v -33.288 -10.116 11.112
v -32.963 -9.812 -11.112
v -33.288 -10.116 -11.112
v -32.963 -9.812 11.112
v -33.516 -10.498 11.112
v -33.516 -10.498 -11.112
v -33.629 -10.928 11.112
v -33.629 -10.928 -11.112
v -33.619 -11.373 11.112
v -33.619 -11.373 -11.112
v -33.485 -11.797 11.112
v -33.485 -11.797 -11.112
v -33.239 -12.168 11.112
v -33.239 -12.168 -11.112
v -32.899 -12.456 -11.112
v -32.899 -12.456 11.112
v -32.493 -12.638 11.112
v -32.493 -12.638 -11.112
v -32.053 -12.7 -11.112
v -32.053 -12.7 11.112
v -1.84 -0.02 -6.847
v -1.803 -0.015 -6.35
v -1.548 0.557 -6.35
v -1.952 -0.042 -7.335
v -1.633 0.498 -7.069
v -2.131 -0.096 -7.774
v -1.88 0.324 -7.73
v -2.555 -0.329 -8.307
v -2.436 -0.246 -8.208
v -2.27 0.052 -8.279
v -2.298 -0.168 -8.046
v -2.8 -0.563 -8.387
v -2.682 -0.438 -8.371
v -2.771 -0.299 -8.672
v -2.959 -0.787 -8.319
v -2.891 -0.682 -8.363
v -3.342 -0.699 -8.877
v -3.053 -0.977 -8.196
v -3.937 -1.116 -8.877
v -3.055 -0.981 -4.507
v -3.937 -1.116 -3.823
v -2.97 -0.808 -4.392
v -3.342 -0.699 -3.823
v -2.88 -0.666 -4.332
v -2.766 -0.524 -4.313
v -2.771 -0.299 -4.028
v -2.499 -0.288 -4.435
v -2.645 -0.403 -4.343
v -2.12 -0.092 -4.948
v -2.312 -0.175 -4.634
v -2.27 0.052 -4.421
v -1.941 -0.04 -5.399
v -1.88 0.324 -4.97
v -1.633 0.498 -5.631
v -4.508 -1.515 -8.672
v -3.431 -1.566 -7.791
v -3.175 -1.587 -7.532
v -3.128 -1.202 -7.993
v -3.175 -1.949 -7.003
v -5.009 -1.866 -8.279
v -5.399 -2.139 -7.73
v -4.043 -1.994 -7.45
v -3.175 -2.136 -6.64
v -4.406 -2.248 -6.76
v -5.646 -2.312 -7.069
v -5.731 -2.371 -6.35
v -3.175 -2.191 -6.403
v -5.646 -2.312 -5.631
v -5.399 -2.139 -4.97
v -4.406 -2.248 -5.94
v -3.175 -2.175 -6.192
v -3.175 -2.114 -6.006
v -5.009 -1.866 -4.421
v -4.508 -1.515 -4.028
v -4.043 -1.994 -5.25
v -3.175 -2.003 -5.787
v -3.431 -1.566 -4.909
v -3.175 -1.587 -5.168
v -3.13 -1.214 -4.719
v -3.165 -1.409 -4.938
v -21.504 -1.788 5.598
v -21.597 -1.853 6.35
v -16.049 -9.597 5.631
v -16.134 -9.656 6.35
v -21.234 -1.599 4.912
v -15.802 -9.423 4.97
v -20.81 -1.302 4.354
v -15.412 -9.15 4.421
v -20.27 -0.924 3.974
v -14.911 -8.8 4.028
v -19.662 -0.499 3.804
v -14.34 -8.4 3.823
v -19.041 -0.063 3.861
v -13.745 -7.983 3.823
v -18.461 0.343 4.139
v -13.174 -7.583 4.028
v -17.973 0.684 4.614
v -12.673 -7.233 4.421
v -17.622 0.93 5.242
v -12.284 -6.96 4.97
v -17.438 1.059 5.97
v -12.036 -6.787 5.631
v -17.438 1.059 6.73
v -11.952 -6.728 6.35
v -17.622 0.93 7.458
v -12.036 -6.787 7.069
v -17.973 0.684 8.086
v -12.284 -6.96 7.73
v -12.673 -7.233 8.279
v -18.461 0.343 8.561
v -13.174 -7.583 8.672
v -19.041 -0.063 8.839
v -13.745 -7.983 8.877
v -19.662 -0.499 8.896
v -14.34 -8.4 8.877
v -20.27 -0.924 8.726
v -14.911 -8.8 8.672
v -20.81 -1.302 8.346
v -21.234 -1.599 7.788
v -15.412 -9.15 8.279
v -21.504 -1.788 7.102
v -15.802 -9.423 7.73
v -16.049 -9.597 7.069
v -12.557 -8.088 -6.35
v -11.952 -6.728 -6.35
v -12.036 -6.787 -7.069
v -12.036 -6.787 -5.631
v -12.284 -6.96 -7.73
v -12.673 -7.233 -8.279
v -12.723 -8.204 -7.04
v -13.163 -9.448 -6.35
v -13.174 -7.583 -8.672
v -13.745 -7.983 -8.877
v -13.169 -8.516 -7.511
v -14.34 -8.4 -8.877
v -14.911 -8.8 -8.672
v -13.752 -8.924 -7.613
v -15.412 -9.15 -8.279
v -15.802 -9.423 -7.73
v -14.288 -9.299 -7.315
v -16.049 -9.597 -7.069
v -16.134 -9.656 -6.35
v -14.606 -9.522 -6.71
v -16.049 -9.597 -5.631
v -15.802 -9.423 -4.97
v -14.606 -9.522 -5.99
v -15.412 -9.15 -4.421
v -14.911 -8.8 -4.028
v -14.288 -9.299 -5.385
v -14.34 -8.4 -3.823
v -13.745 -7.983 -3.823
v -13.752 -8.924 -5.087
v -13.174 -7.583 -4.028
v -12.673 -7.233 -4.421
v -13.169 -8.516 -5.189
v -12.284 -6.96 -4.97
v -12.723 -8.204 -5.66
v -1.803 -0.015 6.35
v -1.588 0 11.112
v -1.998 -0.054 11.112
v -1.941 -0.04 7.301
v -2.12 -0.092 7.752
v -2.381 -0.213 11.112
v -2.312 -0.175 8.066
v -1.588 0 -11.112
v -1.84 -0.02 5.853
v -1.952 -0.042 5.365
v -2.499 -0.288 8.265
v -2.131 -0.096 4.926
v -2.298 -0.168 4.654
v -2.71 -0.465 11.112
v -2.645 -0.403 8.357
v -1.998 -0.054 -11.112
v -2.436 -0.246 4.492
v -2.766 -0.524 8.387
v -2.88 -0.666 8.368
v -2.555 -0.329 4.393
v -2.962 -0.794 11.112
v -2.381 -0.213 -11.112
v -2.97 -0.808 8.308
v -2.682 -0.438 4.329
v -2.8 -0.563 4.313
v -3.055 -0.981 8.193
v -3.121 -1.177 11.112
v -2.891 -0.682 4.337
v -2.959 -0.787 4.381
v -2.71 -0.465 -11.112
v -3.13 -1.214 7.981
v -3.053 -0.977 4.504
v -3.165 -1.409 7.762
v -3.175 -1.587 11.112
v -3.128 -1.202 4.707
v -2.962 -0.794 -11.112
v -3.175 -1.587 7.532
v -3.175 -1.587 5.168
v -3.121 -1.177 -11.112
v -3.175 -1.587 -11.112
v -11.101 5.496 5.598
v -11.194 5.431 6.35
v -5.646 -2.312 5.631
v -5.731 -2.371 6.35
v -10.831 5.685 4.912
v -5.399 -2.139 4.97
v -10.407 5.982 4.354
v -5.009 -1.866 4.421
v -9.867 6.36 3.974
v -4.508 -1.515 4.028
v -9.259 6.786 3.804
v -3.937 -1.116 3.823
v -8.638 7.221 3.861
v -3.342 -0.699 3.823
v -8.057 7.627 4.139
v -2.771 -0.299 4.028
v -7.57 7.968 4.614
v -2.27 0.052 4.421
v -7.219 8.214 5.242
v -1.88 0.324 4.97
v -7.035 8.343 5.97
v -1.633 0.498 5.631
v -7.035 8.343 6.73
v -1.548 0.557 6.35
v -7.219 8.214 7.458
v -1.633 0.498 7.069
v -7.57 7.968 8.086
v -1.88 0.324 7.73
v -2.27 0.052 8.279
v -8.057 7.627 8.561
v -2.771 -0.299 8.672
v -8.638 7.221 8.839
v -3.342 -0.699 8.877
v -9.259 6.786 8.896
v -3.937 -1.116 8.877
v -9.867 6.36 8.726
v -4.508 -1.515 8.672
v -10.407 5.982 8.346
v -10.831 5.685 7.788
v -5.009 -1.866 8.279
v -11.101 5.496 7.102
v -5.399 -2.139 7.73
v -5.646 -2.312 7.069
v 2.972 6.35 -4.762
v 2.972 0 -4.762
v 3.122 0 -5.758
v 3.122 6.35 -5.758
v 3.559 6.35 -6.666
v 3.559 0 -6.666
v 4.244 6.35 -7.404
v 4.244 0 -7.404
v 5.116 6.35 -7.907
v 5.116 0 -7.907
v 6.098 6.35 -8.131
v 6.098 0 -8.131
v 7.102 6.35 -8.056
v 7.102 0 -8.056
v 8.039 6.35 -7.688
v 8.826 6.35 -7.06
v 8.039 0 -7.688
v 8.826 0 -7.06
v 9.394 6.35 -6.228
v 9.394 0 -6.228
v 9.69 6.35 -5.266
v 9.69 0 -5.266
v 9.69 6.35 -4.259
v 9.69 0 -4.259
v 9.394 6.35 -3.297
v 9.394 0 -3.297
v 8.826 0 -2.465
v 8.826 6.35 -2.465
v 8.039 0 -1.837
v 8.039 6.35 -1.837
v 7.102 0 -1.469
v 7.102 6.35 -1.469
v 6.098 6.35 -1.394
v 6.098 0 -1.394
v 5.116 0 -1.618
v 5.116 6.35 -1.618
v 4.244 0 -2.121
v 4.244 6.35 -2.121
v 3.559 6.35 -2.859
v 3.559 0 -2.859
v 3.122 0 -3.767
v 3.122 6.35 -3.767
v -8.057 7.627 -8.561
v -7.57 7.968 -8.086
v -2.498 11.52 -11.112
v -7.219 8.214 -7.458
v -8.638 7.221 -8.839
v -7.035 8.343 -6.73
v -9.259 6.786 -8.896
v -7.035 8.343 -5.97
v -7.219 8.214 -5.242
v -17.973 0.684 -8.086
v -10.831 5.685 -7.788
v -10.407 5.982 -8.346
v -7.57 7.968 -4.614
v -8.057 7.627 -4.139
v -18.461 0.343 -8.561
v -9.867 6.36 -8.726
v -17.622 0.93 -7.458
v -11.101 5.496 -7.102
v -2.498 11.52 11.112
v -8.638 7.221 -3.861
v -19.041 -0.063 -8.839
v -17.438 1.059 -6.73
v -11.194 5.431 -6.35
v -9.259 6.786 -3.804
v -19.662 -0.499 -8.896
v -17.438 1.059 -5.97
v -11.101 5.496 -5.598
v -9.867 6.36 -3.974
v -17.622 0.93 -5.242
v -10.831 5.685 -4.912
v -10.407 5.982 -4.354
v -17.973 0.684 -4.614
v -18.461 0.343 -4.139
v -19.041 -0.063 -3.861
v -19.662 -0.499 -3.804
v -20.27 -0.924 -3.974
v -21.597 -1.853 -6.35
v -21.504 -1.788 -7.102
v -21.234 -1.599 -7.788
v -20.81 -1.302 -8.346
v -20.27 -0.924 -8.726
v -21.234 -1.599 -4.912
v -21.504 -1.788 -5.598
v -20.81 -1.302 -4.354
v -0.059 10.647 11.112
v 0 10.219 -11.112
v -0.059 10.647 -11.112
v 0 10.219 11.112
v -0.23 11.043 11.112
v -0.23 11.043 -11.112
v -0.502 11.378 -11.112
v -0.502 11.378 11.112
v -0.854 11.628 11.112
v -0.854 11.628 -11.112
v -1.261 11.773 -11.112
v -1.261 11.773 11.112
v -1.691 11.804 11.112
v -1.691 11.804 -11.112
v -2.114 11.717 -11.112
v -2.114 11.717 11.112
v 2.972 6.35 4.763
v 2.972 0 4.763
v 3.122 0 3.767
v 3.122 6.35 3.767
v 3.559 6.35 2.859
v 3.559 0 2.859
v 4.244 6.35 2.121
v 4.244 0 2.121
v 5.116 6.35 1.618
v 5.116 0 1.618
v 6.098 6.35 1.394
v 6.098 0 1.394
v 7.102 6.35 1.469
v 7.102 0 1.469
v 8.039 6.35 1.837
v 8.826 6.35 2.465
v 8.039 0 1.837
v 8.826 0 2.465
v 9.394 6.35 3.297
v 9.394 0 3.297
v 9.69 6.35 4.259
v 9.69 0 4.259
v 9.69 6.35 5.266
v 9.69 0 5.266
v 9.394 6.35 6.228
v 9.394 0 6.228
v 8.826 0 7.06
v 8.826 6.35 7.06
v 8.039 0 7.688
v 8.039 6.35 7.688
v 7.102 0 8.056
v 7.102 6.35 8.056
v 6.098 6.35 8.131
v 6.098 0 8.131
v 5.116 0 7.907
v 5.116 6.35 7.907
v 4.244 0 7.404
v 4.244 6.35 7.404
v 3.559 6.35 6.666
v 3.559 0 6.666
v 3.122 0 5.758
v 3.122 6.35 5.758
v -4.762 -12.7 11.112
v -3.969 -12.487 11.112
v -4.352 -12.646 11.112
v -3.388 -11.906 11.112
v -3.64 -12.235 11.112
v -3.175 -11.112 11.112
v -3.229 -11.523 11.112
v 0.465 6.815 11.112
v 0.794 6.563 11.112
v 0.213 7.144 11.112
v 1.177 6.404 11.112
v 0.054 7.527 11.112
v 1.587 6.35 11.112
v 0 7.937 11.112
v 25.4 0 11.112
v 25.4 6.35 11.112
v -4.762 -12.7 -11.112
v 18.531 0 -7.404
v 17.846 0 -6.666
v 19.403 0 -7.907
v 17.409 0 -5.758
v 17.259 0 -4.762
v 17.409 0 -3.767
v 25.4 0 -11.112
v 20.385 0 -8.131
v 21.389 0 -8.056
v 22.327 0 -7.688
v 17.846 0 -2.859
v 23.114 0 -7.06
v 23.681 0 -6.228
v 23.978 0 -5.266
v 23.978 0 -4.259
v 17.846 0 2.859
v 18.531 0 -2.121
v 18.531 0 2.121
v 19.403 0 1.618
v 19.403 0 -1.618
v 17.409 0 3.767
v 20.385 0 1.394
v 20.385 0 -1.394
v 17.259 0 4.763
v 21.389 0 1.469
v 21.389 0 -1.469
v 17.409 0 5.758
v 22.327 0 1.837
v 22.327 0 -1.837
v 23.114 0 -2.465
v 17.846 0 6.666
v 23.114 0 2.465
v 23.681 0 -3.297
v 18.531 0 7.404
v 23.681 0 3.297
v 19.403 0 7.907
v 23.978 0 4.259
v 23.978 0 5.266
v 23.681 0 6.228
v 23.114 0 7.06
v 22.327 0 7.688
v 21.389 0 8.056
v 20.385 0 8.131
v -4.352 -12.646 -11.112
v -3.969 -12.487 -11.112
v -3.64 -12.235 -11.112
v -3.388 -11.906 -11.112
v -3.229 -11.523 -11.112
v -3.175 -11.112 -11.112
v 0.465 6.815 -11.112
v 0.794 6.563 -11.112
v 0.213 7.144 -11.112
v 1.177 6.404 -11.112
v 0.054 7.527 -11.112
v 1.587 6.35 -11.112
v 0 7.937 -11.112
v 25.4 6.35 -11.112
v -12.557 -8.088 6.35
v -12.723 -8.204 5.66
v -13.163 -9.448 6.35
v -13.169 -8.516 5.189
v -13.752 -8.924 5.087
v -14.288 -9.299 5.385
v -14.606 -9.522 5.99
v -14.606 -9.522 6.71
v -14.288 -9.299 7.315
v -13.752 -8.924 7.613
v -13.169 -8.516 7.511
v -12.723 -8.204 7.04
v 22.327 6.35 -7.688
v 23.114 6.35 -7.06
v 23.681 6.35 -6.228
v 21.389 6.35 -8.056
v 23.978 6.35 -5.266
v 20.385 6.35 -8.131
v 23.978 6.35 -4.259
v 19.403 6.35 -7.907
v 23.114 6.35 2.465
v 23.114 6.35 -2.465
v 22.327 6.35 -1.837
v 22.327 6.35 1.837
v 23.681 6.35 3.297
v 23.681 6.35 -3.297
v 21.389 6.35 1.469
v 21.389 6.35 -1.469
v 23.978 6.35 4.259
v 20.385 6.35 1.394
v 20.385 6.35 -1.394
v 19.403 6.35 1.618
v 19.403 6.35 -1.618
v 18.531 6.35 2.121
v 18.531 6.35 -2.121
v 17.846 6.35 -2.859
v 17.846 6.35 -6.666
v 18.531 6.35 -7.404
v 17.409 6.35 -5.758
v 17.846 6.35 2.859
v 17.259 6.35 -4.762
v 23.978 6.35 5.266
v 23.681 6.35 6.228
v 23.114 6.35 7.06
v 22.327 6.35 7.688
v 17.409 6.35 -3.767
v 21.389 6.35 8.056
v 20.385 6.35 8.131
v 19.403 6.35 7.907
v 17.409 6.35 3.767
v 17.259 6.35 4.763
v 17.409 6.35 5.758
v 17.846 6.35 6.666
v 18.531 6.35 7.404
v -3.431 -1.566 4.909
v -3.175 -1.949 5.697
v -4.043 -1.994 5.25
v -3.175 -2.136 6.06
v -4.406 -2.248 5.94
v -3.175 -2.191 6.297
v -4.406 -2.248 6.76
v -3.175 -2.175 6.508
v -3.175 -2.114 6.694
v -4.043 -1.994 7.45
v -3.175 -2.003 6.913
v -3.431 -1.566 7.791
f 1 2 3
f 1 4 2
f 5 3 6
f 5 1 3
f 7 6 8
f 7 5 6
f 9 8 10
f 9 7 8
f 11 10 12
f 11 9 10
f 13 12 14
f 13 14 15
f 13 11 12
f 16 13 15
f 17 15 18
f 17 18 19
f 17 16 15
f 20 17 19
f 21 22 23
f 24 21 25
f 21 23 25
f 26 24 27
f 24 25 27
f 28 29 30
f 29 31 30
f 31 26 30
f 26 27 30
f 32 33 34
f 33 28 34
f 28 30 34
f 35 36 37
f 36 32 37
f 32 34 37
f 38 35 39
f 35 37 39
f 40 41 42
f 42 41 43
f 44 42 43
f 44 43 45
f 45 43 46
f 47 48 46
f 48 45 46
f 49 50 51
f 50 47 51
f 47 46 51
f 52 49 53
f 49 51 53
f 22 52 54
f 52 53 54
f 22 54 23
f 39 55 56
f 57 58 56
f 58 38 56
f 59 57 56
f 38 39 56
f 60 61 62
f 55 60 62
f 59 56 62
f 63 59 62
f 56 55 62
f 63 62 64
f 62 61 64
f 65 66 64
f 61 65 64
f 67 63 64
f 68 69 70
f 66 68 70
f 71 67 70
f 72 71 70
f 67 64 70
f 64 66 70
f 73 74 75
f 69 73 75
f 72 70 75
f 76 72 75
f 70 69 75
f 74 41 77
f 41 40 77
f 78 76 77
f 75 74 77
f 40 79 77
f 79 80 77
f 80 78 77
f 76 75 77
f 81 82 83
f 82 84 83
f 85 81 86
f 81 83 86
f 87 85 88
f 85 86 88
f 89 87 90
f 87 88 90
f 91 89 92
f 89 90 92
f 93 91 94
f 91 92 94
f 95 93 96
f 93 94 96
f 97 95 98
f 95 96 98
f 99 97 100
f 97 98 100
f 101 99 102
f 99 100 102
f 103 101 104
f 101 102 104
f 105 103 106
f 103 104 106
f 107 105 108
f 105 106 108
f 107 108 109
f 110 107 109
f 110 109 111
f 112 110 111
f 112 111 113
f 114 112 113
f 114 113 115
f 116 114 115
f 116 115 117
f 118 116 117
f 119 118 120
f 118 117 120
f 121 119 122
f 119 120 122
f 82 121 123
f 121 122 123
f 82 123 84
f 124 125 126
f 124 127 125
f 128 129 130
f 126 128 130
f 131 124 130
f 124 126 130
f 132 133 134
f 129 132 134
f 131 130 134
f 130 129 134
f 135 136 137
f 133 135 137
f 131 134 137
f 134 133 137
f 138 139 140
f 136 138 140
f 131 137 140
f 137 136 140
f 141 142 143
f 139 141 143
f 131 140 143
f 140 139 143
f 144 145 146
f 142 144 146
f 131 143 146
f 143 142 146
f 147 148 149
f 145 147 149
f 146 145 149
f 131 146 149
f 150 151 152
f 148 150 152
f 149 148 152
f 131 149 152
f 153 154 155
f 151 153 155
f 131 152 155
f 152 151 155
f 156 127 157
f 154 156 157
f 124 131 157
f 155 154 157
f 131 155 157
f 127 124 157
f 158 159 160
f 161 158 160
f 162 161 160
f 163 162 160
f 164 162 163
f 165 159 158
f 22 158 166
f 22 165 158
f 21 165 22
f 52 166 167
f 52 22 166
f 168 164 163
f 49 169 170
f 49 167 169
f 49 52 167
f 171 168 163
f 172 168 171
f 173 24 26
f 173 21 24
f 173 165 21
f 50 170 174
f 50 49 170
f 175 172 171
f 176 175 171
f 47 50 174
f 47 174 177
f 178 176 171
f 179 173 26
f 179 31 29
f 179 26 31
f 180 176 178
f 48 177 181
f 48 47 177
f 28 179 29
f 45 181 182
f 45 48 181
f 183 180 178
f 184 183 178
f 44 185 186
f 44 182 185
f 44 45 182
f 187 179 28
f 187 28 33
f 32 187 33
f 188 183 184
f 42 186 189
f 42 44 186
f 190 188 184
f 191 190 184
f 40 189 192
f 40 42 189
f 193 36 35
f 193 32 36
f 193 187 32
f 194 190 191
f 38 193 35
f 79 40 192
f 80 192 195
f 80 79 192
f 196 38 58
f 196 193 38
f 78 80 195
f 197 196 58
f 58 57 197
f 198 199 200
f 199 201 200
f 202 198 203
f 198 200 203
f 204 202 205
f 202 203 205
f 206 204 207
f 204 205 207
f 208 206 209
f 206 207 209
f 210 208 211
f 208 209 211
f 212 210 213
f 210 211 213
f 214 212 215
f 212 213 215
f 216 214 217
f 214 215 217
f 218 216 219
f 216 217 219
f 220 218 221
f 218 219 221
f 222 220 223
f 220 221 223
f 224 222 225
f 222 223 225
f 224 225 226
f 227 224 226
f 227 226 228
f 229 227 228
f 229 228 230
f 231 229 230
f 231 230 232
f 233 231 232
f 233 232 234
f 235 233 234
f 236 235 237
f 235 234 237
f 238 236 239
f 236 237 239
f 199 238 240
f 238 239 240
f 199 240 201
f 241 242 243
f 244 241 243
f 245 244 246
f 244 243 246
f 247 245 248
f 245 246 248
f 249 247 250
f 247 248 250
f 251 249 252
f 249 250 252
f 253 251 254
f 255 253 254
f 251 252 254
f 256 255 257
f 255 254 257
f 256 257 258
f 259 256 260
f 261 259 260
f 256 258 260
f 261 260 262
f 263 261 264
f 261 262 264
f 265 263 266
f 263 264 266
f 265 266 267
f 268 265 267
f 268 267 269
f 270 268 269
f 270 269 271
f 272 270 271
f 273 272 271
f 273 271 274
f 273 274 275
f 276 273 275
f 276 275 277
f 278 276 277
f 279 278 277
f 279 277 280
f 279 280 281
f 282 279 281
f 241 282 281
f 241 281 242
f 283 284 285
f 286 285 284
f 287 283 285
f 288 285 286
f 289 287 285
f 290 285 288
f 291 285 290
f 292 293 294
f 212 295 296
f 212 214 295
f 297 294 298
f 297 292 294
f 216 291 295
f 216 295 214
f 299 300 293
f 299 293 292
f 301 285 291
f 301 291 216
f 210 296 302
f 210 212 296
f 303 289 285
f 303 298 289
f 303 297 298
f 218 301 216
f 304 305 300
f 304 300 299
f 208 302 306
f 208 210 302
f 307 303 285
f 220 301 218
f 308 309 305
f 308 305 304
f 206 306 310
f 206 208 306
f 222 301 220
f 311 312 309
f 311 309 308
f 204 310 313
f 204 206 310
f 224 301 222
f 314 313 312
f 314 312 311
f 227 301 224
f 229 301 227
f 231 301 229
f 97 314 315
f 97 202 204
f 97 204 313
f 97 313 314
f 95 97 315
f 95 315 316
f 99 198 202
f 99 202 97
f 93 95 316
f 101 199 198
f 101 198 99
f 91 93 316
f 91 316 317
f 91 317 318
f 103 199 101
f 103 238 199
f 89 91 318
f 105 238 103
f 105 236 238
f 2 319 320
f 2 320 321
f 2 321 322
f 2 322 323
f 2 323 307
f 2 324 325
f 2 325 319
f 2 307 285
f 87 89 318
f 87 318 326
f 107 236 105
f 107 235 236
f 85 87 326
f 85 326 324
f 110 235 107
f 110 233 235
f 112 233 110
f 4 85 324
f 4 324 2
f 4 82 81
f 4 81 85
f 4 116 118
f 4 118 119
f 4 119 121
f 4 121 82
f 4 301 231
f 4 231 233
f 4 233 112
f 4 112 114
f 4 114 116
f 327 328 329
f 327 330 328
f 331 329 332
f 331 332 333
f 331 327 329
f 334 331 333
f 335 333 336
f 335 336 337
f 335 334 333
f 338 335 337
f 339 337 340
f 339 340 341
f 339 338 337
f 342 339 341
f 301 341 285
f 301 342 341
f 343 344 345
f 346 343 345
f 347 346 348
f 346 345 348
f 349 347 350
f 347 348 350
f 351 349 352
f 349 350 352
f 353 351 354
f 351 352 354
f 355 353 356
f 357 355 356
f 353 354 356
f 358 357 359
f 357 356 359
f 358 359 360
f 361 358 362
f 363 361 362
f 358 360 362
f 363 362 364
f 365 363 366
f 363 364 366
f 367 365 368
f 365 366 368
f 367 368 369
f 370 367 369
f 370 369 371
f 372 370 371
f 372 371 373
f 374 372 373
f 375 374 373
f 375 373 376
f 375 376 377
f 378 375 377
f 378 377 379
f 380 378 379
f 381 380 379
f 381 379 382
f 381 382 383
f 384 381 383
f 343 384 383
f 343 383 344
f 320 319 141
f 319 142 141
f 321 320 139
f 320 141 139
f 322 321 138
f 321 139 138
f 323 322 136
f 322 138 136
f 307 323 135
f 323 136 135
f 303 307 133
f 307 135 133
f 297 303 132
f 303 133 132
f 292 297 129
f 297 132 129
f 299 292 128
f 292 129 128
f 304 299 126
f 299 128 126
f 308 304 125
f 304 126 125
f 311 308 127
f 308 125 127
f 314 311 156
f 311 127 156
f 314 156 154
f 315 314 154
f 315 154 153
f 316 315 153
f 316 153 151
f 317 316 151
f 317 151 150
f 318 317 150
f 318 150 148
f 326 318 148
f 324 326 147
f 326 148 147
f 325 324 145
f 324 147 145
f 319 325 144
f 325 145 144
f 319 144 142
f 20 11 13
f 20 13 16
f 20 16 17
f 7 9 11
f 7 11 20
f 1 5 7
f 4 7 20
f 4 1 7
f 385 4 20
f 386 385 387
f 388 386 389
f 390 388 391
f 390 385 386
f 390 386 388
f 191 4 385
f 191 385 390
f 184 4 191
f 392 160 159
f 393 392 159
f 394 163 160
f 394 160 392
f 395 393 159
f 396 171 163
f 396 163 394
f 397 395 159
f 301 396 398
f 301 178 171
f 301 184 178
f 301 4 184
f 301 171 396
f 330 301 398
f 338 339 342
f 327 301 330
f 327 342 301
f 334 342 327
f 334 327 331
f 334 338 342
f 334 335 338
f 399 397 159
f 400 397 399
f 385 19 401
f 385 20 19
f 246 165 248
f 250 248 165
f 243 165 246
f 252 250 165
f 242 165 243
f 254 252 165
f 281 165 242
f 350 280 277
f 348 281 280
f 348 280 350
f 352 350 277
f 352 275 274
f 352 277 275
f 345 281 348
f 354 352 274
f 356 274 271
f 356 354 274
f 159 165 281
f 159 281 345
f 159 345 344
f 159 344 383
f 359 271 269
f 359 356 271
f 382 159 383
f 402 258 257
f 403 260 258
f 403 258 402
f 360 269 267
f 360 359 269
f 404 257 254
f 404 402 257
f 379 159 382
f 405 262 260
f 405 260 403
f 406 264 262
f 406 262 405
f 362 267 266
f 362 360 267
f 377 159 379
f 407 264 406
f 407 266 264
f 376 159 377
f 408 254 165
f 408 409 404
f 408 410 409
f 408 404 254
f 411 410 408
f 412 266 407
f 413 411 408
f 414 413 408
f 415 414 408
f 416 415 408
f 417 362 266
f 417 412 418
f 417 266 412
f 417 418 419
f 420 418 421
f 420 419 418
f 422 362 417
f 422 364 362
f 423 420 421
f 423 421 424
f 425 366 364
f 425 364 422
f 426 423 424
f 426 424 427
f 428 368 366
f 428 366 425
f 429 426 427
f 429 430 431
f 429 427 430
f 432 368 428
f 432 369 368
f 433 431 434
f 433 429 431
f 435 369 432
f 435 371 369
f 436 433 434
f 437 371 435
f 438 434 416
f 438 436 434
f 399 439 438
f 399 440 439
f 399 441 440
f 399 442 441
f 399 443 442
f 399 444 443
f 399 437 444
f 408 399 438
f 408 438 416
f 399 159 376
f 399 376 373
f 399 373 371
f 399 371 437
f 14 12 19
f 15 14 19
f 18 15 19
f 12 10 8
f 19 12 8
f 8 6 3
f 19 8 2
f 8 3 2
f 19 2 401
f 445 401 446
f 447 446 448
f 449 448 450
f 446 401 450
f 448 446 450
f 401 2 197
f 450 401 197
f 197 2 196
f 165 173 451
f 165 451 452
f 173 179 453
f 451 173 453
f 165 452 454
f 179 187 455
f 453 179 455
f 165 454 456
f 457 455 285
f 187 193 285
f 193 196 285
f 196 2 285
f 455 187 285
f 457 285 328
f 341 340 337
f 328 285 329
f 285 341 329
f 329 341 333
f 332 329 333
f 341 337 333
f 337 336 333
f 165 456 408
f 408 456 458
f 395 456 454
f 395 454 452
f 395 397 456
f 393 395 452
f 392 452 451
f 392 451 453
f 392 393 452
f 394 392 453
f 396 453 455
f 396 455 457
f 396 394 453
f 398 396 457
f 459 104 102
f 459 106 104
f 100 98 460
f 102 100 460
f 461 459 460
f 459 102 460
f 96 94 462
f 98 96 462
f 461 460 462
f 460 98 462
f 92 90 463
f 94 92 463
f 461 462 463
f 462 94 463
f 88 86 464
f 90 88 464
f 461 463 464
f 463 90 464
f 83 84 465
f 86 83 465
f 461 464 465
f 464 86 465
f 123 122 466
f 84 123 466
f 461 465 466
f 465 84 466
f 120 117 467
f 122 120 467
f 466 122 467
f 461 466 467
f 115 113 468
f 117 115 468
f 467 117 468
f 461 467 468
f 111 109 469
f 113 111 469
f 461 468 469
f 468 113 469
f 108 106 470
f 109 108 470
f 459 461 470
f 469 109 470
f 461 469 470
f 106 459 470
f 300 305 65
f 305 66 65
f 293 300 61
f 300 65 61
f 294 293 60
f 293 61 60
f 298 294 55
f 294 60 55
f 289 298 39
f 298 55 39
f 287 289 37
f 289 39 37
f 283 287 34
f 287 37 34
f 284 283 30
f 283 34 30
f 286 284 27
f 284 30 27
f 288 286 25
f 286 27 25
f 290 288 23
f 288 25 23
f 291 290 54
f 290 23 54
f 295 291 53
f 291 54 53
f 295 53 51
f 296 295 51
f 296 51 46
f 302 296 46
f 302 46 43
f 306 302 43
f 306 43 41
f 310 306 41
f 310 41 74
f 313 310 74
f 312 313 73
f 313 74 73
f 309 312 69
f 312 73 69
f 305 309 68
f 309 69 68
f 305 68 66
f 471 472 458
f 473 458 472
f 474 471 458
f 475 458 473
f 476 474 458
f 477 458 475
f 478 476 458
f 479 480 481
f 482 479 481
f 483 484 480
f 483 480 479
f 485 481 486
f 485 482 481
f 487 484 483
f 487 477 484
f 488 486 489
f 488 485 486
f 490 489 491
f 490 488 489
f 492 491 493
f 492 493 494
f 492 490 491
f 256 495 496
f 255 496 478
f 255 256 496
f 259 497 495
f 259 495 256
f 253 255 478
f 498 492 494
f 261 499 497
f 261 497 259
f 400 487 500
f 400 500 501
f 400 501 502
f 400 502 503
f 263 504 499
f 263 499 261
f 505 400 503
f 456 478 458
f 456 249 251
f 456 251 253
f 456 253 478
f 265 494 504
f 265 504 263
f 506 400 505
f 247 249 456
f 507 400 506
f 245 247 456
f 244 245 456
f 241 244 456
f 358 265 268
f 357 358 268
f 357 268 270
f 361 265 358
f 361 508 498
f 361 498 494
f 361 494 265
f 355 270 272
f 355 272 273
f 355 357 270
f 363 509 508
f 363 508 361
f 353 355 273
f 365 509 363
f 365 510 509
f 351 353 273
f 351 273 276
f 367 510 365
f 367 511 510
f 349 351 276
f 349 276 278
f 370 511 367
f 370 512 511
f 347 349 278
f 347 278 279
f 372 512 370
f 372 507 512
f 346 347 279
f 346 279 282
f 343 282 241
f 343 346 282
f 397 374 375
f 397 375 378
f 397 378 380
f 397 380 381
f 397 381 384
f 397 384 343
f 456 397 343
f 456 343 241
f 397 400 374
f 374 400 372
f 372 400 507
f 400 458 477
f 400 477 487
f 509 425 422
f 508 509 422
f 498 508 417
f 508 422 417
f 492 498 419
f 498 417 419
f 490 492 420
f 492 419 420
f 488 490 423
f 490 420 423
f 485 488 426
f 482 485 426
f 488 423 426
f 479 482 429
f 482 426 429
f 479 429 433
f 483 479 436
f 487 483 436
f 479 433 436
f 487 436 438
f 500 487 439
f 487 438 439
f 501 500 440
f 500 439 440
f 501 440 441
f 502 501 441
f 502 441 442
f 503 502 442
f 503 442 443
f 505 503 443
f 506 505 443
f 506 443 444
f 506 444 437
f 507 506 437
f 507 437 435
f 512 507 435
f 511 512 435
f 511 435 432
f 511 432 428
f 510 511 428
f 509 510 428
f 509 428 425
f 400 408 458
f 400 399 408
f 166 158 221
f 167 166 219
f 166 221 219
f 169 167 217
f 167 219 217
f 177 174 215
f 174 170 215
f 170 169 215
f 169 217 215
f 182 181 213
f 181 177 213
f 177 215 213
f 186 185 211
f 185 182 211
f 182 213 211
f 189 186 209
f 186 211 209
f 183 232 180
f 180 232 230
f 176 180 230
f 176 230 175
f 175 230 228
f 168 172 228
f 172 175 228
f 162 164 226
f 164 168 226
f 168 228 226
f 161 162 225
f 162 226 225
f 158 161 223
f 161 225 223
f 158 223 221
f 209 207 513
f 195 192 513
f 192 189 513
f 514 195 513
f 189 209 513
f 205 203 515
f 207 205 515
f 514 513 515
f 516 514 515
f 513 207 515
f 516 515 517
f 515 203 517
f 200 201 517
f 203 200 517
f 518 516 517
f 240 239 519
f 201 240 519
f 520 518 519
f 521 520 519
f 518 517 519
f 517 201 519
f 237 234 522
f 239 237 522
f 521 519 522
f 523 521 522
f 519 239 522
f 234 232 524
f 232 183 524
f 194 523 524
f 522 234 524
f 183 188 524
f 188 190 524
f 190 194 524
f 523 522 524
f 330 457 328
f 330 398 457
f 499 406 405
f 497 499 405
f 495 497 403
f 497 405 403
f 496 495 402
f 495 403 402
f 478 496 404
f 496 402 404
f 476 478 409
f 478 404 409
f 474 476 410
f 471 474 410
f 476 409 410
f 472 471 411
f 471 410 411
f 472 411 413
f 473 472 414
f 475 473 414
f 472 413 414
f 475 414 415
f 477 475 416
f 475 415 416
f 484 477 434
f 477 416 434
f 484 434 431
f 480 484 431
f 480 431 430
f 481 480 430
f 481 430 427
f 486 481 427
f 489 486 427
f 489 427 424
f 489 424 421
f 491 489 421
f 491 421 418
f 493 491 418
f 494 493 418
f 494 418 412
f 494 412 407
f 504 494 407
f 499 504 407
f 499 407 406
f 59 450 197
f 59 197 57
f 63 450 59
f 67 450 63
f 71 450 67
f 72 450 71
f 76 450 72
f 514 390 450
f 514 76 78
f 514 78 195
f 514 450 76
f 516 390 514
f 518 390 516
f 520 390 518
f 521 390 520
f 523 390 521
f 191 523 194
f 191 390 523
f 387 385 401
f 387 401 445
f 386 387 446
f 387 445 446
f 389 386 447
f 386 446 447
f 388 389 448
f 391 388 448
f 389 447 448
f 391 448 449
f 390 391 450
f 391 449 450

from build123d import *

# Parameters (mm, degrees)
BOSS_EXTRUDE1_DEPTH             = 11.1125
F_1_4_CLEARANCE_HOLE1_D         = 6.7564
FILLET1_R                       = 1.5875
TAP_DRILL_FOR_1_4_20_TAP1_D     = 5.1054
TAP_DRILL_FOR_1_4_20_TAP1_DEPTH = 9.525
TAP_DRILL_FOR_1_4_20_TAP1_TIP   = 1.533816902


with BuildPart() as part:
    # Sketch1 → Boss-Extrude1 (new, symmetric)
    with BuildSketch(Plane.XY):
        Polygon((0, 0), (25.4, 0), (25.4, 6.35), (0, 6.35), (0, 13.269040681), (-37.087633685, -12.7), (-3.175, -12.7), (-3.175, 0), align=None)
    extrude(amount=BOSS_EXTRUDE1_DEPTH, both=True)

    # 1/4 Clearance Hole1 (through all)
    with Locations(Plane(origin=(0, 6.35, 0), x_dir=(1, 0, 0), z_dir=(0, 1, 0))):
        with Locations((6.35, 4.7625), (20.6375, 4.7625), (6.35, -4.7625), (20.6375, -4.7625)):
            Hole(F_1_4_CLEARANCE_HOLE1_D / 2)

    # Fillet1
    fillet1_edges = [part.edges().sort_by_distance(p)[0] for p in [
        (-3.175, 0, 0),
        (-3.175, -12.7, 0),
        (-37.087633685, -12.7, 0),
        (0, 13.269040681, 0),
        (0, 6.35, 0),
    ]]
    fillet(fillet1_edges, radius=FILLET1_R)

    # Tap Drill for 1/4-20 Tap1
    with Locations(Plane(origin=(-6.234409806, 8.903659938, 0), x_dir=(0.8191520442889947, 0.5735764363510422, 0), z_dir=(-0.573576436351042, 0.8191520442889946, 0))):
        with Locations((-16.201690933, 6.35), (-3.501690933, 6.35), (-3.501690933, -6.35), (-16.201690933, -6.35)):
            Hole(TAP_DRILL_FOR_1_4_20_TAP1_D / 2, depth=TAP_DRILL_FOR_1_4_20_TAP1_DEPTH)
            with Locations((0, 0, -(TAP_DRILL_FOR_1_4_20_TAP1_DEPTH + TAP_DRILL_FOR_1_4_20_TAP1_TIP / 2))):  # 118° drill point
                Cone(0, TAP_DRILL_FOR_1_4_20_TAP1_D / 2, TAP_DRILL_FOR_1_4_20_TAP1_TIP, mode=Mode.SUBTRACT)


solid = part.part
